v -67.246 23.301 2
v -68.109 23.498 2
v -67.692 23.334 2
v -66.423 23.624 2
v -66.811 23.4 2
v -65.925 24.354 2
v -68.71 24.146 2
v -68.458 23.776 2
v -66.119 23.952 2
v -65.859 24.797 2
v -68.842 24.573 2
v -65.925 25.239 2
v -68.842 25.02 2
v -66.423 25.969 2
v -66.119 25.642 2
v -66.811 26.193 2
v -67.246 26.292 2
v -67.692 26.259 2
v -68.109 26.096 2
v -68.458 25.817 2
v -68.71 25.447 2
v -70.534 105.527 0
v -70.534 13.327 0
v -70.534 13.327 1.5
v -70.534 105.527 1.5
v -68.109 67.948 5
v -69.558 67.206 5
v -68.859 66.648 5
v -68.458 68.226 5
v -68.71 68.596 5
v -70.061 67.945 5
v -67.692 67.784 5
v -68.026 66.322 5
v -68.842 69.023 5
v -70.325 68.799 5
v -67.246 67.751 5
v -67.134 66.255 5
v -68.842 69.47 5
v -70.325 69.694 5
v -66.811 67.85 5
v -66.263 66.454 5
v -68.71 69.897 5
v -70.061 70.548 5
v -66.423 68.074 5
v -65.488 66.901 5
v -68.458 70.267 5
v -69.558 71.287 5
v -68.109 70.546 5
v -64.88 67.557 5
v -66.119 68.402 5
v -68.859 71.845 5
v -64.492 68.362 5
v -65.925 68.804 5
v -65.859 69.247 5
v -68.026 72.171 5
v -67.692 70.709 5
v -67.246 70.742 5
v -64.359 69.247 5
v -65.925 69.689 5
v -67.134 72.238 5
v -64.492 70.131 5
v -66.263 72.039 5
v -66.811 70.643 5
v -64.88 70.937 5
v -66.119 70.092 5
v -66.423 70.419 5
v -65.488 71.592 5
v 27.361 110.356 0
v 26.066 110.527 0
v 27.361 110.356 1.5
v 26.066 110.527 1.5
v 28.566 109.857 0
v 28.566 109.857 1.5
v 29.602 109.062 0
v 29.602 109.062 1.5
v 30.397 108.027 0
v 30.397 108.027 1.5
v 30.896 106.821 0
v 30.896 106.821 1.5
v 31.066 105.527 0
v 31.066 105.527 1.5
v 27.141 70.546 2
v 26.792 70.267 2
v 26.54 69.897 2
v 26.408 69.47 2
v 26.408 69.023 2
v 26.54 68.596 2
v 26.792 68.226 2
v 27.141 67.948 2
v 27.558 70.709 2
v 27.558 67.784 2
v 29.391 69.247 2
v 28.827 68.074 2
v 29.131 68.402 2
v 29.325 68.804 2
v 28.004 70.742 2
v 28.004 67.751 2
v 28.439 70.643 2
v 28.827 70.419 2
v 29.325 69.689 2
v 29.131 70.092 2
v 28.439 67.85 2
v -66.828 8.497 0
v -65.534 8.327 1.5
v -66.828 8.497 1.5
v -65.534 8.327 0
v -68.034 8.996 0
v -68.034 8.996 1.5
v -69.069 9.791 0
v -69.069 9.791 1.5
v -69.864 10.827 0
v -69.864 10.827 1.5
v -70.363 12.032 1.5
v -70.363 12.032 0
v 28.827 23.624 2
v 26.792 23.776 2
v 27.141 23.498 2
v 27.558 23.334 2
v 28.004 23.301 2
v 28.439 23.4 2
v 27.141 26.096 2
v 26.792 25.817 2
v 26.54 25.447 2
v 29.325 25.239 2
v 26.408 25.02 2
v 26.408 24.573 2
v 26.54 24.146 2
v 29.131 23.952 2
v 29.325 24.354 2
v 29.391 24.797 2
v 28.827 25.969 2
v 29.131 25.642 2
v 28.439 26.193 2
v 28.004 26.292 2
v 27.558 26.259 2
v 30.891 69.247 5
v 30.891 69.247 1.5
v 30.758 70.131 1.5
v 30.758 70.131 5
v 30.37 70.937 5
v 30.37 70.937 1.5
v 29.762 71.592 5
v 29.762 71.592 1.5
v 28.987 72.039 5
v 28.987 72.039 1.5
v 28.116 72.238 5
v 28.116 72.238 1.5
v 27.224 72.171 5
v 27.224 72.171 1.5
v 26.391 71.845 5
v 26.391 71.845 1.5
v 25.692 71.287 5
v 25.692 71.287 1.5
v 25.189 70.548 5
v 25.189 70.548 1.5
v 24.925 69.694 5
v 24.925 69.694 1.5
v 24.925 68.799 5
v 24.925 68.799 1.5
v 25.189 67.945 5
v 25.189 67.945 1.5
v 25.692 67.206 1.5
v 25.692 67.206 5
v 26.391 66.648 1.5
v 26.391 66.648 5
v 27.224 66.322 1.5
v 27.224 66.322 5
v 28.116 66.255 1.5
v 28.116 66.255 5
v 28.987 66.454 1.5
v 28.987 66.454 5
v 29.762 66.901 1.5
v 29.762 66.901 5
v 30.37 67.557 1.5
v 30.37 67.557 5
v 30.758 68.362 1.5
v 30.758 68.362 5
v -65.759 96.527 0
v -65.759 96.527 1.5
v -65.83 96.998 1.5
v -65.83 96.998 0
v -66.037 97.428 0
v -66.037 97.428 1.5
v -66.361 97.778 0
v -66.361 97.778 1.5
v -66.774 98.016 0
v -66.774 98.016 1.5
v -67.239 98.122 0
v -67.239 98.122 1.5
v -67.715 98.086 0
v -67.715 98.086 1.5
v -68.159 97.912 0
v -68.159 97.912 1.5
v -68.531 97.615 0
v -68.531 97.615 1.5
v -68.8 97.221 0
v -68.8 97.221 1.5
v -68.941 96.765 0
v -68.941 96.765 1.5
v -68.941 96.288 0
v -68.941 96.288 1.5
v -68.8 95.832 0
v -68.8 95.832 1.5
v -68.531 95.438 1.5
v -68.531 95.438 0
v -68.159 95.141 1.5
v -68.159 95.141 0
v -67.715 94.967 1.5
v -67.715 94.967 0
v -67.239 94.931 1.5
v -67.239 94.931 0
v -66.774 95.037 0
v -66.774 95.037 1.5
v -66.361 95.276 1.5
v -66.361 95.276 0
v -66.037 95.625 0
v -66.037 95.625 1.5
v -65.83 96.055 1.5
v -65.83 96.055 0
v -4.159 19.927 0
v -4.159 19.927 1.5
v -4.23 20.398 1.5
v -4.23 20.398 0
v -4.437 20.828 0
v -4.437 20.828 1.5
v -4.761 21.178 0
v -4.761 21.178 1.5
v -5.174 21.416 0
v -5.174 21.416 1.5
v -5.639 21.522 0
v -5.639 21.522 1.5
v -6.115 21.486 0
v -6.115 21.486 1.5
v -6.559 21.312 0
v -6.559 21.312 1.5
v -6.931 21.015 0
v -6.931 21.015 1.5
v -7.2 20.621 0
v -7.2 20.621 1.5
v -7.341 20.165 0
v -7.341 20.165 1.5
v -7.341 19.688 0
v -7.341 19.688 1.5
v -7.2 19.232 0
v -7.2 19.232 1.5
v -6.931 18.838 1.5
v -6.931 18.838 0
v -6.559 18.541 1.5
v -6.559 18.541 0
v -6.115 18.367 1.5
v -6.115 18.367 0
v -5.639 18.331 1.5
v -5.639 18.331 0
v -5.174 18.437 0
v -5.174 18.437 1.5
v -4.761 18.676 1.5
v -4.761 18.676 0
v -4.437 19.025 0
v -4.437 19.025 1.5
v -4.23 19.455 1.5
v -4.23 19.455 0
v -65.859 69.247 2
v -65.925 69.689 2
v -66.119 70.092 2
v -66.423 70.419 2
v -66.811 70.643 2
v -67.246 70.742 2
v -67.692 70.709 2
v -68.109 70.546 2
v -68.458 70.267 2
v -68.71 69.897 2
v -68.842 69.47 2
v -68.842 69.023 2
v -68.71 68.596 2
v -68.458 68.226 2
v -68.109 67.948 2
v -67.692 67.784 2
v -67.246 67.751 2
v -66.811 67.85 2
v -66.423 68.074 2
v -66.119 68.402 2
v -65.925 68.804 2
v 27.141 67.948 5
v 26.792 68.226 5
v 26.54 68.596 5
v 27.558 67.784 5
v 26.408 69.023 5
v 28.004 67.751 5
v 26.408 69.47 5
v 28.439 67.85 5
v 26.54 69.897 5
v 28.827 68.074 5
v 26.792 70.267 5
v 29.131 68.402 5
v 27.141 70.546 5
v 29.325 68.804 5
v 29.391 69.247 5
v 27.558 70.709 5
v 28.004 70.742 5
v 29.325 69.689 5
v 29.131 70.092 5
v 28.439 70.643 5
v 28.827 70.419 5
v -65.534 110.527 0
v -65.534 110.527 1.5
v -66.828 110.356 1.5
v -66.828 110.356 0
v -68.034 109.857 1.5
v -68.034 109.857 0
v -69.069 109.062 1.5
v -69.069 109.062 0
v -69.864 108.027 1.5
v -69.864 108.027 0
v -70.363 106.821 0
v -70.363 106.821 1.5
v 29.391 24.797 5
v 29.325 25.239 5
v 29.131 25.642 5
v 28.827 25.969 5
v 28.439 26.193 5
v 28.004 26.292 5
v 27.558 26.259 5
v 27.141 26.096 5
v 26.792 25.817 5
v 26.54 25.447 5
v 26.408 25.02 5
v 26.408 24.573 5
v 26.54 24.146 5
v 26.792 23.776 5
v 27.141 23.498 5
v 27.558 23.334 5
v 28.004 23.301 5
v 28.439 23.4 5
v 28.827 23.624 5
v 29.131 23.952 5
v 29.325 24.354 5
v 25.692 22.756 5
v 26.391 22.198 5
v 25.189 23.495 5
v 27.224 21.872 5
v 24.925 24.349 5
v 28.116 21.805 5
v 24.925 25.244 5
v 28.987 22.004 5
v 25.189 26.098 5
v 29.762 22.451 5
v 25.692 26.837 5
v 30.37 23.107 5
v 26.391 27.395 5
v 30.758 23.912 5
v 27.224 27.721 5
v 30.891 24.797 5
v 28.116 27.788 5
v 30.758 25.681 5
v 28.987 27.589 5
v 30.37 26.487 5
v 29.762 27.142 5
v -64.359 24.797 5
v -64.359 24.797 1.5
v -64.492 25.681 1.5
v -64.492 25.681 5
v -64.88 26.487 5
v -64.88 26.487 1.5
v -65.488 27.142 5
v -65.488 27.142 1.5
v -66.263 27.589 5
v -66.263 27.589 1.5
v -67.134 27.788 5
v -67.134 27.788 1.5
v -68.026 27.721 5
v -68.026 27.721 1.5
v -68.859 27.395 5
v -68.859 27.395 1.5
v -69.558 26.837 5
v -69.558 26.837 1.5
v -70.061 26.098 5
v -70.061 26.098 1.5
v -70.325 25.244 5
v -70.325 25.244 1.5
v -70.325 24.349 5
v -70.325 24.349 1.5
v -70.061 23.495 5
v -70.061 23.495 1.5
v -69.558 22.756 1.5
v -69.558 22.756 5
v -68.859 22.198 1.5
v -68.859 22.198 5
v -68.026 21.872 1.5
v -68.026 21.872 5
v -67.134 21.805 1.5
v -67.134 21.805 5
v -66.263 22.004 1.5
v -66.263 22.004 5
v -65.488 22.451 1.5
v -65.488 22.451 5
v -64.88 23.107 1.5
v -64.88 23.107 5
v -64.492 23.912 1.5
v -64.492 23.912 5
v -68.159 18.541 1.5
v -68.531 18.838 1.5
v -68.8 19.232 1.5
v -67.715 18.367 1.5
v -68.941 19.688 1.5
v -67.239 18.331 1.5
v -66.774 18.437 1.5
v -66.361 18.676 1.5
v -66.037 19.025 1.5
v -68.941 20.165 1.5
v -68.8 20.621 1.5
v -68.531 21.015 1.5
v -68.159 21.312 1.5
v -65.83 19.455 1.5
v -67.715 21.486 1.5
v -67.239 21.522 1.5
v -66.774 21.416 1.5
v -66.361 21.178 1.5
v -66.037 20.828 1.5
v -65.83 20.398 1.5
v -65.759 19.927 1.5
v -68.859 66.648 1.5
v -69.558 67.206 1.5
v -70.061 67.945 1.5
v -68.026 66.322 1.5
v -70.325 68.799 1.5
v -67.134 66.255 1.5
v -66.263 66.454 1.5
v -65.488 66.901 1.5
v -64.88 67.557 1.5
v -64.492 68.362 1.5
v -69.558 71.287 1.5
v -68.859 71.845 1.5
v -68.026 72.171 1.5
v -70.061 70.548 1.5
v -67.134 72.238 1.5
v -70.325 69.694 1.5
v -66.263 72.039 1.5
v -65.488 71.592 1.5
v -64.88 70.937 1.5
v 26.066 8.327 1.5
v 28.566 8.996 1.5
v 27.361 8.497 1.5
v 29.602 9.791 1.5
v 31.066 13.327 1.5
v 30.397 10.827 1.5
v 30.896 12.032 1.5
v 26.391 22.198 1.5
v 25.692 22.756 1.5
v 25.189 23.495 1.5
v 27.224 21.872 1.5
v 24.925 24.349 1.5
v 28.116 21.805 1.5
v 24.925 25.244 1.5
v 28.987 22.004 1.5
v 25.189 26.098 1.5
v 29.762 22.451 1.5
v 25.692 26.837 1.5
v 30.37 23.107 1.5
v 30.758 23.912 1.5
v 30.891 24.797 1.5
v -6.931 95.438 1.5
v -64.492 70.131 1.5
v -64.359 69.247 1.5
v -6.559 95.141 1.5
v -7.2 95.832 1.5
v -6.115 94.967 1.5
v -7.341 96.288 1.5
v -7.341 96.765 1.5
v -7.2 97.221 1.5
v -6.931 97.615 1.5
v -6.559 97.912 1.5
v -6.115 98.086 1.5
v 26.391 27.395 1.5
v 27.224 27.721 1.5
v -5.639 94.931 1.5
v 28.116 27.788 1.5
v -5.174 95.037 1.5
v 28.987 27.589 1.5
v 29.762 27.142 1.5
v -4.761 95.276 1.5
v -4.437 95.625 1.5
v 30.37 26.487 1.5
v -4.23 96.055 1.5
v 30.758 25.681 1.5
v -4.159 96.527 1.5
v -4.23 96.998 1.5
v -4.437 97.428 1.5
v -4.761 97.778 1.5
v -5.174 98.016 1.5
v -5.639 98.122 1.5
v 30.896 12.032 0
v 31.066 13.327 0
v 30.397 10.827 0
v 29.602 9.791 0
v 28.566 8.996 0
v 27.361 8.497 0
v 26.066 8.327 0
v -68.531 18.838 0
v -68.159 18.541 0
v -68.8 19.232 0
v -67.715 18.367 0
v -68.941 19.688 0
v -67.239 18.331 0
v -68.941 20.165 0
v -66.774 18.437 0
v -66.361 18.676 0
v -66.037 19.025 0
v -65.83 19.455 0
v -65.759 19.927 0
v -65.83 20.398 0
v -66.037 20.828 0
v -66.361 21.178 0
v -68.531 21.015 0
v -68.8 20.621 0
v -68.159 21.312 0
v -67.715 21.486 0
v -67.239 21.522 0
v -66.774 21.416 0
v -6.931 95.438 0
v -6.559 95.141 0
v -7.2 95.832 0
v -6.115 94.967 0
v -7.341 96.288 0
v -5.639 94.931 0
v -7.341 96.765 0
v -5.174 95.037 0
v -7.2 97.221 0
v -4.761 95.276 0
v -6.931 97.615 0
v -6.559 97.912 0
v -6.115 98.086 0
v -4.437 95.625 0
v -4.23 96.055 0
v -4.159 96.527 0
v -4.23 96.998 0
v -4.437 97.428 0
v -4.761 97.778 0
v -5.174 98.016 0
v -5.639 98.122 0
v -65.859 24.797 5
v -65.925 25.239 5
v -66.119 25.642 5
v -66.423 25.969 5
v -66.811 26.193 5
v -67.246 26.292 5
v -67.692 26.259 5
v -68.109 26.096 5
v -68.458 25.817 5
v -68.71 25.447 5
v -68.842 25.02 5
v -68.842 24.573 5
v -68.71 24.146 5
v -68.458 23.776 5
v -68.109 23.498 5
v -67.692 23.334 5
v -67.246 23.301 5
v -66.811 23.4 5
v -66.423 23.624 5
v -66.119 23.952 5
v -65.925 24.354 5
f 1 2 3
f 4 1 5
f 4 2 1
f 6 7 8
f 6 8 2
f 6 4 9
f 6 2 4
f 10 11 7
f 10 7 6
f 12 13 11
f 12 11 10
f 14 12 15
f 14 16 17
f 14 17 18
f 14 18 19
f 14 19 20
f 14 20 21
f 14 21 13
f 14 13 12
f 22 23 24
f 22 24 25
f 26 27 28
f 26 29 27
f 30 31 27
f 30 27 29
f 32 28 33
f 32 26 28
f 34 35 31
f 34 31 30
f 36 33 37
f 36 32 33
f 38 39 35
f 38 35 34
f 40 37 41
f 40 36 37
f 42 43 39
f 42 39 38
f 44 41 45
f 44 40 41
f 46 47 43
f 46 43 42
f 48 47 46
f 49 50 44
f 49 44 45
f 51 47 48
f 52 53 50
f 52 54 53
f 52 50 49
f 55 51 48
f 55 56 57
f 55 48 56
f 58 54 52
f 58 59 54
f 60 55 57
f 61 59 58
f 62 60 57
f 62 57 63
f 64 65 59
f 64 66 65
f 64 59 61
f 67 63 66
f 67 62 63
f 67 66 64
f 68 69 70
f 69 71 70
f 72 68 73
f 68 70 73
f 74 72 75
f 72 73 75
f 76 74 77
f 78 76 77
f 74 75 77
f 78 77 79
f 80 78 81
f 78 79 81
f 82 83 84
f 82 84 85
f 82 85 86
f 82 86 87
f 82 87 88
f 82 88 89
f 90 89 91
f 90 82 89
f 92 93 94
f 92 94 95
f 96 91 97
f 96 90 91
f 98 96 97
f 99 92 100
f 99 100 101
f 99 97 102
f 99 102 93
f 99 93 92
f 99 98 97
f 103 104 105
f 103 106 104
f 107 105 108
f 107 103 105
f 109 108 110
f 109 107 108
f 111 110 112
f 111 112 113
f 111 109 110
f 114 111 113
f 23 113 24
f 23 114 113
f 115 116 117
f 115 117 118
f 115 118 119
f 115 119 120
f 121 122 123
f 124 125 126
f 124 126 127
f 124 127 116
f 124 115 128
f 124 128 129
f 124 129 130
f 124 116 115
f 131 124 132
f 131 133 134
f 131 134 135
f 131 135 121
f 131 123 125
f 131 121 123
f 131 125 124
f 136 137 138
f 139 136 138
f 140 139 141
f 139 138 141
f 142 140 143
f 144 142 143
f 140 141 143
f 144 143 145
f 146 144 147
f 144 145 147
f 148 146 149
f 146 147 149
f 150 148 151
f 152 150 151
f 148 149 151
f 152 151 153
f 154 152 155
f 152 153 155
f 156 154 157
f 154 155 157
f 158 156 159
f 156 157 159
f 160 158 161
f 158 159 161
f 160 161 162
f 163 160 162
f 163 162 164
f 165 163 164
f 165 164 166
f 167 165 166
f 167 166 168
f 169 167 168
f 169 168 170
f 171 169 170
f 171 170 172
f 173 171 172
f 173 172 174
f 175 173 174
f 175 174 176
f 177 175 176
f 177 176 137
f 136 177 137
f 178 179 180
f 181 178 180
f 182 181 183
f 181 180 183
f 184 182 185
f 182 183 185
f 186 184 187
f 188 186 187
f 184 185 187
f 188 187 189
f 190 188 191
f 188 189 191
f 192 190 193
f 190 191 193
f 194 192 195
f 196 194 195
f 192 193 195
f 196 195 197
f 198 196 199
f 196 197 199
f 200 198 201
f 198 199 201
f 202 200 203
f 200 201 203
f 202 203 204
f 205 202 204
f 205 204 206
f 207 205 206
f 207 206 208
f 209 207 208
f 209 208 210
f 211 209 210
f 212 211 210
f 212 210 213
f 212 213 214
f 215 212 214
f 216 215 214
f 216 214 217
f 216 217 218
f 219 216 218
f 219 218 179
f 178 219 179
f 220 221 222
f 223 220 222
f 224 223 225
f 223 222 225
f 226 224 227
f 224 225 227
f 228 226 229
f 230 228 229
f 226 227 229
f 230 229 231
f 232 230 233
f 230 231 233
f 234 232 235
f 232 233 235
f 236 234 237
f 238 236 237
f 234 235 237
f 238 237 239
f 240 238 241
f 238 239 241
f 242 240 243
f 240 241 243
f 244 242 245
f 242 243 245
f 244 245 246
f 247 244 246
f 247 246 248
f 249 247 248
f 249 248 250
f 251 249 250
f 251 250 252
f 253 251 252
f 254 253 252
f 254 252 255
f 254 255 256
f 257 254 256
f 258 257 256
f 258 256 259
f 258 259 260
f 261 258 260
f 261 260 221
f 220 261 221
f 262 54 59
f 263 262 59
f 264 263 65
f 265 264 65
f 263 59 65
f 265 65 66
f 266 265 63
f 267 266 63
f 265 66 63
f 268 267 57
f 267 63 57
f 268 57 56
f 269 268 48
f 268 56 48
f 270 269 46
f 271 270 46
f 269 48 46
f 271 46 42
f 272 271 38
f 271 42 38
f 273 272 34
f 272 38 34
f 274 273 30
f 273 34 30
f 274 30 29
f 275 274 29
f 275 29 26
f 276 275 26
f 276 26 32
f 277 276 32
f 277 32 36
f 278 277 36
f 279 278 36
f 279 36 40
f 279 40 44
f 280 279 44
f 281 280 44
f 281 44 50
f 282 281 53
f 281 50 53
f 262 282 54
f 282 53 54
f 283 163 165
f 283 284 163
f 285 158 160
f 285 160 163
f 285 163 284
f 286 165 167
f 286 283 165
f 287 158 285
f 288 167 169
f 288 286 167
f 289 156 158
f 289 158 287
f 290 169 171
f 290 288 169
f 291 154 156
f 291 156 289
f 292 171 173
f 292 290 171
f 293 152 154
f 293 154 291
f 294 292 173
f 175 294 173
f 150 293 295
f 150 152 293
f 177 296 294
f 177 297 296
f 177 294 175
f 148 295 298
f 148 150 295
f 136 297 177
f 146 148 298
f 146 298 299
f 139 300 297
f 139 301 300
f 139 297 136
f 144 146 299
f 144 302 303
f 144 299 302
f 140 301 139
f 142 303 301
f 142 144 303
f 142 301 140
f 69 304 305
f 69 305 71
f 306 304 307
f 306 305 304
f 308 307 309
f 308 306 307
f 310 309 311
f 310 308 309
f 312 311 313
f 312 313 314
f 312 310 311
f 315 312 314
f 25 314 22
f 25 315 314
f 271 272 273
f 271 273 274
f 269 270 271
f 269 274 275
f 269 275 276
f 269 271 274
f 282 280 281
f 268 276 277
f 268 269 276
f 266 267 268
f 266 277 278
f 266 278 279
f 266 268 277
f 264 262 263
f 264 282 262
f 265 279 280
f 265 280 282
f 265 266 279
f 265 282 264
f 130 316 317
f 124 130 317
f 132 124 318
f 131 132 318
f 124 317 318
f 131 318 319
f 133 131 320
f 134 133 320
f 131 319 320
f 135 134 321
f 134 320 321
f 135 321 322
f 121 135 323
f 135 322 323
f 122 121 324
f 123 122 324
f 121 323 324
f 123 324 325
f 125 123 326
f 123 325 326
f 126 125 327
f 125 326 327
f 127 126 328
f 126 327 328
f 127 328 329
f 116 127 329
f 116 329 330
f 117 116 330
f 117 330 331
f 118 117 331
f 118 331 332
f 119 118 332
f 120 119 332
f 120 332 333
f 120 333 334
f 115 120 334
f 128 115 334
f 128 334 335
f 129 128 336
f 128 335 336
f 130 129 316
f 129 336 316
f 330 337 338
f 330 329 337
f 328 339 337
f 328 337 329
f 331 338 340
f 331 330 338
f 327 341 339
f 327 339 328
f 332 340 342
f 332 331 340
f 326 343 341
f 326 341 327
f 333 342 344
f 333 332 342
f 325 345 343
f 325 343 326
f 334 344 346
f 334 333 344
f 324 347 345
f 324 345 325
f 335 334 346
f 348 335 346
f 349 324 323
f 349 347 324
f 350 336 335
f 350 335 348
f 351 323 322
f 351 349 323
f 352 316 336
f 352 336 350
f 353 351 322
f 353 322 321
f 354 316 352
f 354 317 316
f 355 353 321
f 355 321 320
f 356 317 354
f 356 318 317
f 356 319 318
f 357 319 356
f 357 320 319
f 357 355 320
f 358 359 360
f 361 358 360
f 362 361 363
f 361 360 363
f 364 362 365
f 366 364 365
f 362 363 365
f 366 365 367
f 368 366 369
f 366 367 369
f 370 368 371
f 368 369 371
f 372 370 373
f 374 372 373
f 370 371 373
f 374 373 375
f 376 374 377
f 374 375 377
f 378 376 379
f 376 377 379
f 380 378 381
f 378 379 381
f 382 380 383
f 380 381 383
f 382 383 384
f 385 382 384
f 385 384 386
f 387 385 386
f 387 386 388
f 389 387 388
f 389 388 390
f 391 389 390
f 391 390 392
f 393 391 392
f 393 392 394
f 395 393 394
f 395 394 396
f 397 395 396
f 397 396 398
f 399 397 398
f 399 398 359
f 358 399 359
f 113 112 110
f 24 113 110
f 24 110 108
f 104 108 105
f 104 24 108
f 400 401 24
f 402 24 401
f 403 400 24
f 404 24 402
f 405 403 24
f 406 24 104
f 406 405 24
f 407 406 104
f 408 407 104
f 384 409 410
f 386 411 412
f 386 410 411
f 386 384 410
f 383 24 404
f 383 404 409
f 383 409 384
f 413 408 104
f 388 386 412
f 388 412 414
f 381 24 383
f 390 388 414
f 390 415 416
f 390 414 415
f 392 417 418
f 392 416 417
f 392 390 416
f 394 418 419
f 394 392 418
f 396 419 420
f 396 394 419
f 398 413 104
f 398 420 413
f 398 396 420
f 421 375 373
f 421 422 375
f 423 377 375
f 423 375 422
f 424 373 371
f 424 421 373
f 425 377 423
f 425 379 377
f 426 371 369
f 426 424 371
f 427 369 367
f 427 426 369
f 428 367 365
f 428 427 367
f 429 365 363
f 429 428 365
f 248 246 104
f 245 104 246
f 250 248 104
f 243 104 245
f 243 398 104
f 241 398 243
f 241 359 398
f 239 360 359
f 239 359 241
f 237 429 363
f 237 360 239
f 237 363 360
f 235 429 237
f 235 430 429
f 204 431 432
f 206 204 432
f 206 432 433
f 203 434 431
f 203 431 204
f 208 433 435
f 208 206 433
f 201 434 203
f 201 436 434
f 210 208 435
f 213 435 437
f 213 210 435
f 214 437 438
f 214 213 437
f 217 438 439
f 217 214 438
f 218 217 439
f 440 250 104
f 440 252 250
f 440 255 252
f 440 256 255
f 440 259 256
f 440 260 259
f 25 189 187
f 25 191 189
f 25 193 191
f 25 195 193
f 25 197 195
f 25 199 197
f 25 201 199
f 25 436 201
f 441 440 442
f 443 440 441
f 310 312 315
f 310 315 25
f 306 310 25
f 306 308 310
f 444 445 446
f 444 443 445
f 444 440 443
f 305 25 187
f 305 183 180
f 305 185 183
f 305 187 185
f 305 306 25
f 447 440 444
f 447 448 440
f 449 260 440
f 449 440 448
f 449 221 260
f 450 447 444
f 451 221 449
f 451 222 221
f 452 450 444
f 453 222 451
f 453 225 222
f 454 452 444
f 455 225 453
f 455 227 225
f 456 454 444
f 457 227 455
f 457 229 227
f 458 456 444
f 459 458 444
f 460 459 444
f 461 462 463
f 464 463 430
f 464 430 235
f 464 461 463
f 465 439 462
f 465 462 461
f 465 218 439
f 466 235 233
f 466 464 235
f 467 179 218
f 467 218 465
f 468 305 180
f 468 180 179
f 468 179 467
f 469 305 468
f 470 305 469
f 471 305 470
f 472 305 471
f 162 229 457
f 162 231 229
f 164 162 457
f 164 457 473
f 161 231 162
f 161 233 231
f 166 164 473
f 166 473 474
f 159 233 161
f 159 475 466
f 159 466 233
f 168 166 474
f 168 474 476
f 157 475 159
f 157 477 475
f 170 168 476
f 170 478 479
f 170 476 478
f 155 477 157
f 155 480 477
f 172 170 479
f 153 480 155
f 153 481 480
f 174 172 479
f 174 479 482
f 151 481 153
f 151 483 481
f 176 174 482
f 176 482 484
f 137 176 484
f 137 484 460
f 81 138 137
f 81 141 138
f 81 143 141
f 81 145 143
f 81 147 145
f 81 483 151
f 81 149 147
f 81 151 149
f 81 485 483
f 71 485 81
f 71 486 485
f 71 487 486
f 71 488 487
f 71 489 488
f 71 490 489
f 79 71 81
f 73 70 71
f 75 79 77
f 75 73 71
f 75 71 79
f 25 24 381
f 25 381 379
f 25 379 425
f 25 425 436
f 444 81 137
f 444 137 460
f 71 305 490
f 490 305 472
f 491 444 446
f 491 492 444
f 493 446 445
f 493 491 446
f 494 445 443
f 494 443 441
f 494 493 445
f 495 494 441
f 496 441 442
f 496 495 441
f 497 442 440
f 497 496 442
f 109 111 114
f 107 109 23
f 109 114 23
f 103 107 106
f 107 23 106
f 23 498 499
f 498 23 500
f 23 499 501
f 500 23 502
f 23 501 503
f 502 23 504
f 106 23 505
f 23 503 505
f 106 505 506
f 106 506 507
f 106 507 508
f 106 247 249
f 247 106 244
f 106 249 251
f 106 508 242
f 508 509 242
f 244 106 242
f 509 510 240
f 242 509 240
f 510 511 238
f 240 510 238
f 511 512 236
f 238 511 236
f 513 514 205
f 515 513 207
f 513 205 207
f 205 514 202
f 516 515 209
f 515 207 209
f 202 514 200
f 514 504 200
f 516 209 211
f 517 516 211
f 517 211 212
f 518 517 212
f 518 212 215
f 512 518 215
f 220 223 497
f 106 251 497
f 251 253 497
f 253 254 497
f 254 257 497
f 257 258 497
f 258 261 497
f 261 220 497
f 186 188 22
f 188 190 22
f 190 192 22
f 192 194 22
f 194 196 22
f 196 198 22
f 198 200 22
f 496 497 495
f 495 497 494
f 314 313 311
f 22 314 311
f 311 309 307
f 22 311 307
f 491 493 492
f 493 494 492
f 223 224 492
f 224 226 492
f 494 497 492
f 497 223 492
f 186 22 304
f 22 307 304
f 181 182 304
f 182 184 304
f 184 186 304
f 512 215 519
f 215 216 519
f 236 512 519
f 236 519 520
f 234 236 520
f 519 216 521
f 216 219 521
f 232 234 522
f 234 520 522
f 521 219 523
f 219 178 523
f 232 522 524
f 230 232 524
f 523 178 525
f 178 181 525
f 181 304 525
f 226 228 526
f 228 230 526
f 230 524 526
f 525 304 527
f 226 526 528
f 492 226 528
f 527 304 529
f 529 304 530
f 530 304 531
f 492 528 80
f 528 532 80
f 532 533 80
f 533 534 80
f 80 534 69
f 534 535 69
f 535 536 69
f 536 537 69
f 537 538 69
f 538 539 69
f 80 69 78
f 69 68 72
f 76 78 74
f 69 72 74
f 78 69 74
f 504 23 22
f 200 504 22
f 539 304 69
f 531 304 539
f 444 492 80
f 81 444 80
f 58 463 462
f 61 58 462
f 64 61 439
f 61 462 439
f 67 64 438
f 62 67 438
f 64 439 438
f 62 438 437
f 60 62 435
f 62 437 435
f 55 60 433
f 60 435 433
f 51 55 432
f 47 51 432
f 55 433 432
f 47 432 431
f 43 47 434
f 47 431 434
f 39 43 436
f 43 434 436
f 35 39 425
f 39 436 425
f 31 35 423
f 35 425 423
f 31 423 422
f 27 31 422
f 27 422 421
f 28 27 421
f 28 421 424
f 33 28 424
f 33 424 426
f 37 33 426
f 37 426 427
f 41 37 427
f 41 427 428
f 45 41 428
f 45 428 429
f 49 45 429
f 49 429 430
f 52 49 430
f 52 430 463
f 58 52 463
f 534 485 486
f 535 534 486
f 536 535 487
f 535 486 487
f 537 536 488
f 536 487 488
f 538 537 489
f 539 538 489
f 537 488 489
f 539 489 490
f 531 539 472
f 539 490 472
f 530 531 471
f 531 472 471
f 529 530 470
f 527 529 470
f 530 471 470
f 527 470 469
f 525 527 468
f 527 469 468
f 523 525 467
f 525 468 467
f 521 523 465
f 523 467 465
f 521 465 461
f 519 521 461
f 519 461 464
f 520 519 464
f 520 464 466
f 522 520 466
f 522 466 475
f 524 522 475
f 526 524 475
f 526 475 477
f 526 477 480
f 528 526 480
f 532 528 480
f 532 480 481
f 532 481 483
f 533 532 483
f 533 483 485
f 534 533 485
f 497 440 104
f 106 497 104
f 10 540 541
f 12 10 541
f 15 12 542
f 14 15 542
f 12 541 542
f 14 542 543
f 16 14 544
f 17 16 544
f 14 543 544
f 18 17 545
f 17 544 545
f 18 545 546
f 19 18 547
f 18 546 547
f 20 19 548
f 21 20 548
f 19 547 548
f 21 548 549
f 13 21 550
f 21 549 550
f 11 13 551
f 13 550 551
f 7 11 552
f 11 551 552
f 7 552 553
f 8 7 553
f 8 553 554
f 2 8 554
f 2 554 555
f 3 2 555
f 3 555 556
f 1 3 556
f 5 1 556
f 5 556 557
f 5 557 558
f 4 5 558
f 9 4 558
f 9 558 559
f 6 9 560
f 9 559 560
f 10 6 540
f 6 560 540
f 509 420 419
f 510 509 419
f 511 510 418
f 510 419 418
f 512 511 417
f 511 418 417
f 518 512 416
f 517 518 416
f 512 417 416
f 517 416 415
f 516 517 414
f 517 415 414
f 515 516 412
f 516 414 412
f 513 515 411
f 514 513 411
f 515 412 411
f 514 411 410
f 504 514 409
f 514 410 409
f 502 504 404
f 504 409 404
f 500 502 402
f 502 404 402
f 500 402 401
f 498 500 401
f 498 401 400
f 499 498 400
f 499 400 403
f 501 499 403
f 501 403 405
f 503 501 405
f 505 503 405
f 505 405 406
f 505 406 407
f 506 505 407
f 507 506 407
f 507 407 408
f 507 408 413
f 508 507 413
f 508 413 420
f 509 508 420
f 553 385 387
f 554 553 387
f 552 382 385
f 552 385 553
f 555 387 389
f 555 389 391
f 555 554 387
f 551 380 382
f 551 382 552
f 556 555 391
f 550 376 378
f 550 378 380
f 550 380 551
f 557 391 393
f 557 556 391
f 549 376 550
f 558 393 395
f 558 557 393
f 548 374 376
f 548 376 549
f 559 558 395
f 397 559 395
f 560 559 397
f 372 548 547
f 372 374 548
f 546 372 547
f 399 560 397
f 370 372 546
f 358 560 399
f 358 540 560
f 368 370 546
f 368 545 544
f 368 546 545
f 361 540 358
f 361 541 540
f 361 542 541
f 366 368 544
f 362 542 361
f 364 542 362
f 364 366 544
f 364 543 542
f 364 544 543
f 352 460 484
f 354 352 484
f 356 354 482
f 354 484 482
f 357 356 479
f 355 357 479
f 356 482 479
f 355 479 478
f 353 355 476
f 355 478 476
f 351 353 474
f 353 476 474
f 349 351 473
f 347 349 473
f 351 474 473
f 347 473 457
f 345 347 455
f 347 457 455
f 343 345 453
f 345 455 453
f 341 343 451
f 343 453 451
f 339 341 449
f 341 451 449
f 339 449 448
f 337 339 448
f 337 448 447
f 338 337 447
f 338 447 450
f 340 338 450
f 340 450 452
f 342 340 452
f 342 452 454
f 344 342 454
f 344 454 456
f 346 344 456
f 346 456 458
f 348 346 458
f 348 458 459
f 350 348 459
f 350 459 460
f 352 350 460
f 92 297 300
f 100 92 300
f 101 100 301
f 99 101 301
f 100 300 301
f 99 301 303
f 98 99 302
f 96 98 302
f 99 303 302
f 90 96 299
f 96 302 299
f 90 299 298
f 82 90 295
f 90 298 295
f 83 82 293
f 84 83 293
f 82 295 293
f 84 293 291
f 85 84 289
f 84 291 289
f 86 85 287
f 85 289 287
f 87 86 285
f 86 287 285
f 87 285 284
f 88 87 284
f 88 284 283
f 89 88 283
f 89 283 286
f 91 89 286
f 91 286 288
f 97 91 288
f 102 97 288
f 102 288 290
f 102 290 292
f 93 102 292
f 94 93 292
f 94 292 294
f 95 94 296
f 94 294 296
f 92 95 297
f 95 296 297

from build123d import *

# Parameters (mm, degrees)
F0_W     = 101.6
F0_H     = 147
F0_R     = 3
F1_DEPTH = 1.5
F2_R     = 1.6
F3_DEPTH = 25
F4_DEPTH = 5
F5_R     = 1.5
F6_DEPTH = 3
F7_W     = 101.6
F7_H     = 44.8
F8_DEPTH = 25
F9_R     = 5


# Not quite as in the source:
# - a feature names something its author has since deleted; it is built from what else it names


with BuildPart() as f1:
    # F0 (on Top) → F1 (new body)
    with BuildSketch(Plane.XY):
        with Locations((-19.733554095, 37.0265730321)):
            Rectangle(F0_W, F0_H)
        with Locations((-67.358554095, 24.7965730321)):
            Circle(F0_R, mode=Mode.SUBTRACT)
        with Locations((27.891445905, 24.7965730321)):
            Circle(F0_R, mode=Mode.SUBTRACT)
        with Locations((-67.358554095, 69.2465730321)):
            Circle(F0_R, mode=Mode.SUBTRACT)
        with Locations((27.891445905, 69.2465730321)):
            Circle(F0_R, mode=Mode.SUBTRACT)
    extrude(amount=F1_DEPTH)

    # F2 (on face) → F3 (cut)
    with BuildSketch(Plane.XY.offset(1.5)):
        with Locations((-67.358554095, 96.5265730321)):
            Circle(F2_R)
        with Locations((-5.758554095, 96.5265730321)):
            Circle(F2_R)
        with Locations((-67.358554095, 19.9265730321)):
            Circle(F2_R)
        with Locations((-5.758554095, 19.9265730321)):
            Circle(F2_R)
    extrude(amount=-F3_DEPTH, mode=Mode.SUBTRACT)

    # F0 (on Top) → F4 (join)
    with BuildSketch(Plane.XY):
        with Locations((-67.358554095, 69.2465730321)):
            Circle(F0_R)
        with Locations((-67.358554095, 24.7965730321)):
            Circle(F0_R)
        with Locations((27.891445905, 69.2465730321)):
            Circle(F0_R)
        with Locations((27.891445905, 24.7965730321)):
            Circle(F0_R)
    extrude(amount=F4_DEPTH)

    # F5 (on face) → F6 (cut)
    with BuildSketch(Plane.XY.offset(5)):
        with Locations((-67.358554095, 69.2465730321)):
            Circle(F5_R)
        with Locations((-67.358554095, 24.7965730321)):
            Circle(F5_R)
        with Locations((27.891445905, 69.2465730321)):
            Circle(F5_R)
        with Locations((27.891445905, 24.7965730321)):
            Circle(F5_R)
    extrude(amount=-F6_DEPTH, mode=Mode.SUBTRACT)

    # F7 (on face) → F8 (cut)
    with BuildSketch(Plane.XY.offset(1.5)):
        with Locations((-19.733554095, -14.0734269679)):
            Rectangle(F7_W, F7_H)
        Polygon((-70.533554095, 8.3265730321), (-108.6030122084, 8.3265730321), (-108.6030122084, -69.3553299345), (74.6913593453, -69.3553299345), (74.6913593453, 8.3265730321), (31.066445905, 8.3265730321), (31.066445905, -36.4734269679), (-70.533554095, -36.4734269679), align=None)
        Polygon((-108.166599336, 100.5265730321), (-70.533554095, 100.5265730321), (-70.533554095, 110.5265730321), (31.066445905, 110.5265730321), (31.066445905, 100.5265730321), (58.5440034669, 100.5265730321), (58.5440034669, 119.7288488672), (-108.166599336, 119.7288488672), align=None)
    extrude(amount=-F8_DEPTH, mode=Mode.SUBTRACT)

    # F9
    f9_edges = [f1.edges().sort_by_distance(p)[0] for p in [
        (-70.533554, 8.326573, 0.75),
        (-70.533554, 110.526573, 0.75),
        (31.066446, 8.326573, 0.75),
        (31.066446, 110.526573, 0.75),
    ]]
    fillet(f9_edges, radius=F9_R)


solid = f1.part
